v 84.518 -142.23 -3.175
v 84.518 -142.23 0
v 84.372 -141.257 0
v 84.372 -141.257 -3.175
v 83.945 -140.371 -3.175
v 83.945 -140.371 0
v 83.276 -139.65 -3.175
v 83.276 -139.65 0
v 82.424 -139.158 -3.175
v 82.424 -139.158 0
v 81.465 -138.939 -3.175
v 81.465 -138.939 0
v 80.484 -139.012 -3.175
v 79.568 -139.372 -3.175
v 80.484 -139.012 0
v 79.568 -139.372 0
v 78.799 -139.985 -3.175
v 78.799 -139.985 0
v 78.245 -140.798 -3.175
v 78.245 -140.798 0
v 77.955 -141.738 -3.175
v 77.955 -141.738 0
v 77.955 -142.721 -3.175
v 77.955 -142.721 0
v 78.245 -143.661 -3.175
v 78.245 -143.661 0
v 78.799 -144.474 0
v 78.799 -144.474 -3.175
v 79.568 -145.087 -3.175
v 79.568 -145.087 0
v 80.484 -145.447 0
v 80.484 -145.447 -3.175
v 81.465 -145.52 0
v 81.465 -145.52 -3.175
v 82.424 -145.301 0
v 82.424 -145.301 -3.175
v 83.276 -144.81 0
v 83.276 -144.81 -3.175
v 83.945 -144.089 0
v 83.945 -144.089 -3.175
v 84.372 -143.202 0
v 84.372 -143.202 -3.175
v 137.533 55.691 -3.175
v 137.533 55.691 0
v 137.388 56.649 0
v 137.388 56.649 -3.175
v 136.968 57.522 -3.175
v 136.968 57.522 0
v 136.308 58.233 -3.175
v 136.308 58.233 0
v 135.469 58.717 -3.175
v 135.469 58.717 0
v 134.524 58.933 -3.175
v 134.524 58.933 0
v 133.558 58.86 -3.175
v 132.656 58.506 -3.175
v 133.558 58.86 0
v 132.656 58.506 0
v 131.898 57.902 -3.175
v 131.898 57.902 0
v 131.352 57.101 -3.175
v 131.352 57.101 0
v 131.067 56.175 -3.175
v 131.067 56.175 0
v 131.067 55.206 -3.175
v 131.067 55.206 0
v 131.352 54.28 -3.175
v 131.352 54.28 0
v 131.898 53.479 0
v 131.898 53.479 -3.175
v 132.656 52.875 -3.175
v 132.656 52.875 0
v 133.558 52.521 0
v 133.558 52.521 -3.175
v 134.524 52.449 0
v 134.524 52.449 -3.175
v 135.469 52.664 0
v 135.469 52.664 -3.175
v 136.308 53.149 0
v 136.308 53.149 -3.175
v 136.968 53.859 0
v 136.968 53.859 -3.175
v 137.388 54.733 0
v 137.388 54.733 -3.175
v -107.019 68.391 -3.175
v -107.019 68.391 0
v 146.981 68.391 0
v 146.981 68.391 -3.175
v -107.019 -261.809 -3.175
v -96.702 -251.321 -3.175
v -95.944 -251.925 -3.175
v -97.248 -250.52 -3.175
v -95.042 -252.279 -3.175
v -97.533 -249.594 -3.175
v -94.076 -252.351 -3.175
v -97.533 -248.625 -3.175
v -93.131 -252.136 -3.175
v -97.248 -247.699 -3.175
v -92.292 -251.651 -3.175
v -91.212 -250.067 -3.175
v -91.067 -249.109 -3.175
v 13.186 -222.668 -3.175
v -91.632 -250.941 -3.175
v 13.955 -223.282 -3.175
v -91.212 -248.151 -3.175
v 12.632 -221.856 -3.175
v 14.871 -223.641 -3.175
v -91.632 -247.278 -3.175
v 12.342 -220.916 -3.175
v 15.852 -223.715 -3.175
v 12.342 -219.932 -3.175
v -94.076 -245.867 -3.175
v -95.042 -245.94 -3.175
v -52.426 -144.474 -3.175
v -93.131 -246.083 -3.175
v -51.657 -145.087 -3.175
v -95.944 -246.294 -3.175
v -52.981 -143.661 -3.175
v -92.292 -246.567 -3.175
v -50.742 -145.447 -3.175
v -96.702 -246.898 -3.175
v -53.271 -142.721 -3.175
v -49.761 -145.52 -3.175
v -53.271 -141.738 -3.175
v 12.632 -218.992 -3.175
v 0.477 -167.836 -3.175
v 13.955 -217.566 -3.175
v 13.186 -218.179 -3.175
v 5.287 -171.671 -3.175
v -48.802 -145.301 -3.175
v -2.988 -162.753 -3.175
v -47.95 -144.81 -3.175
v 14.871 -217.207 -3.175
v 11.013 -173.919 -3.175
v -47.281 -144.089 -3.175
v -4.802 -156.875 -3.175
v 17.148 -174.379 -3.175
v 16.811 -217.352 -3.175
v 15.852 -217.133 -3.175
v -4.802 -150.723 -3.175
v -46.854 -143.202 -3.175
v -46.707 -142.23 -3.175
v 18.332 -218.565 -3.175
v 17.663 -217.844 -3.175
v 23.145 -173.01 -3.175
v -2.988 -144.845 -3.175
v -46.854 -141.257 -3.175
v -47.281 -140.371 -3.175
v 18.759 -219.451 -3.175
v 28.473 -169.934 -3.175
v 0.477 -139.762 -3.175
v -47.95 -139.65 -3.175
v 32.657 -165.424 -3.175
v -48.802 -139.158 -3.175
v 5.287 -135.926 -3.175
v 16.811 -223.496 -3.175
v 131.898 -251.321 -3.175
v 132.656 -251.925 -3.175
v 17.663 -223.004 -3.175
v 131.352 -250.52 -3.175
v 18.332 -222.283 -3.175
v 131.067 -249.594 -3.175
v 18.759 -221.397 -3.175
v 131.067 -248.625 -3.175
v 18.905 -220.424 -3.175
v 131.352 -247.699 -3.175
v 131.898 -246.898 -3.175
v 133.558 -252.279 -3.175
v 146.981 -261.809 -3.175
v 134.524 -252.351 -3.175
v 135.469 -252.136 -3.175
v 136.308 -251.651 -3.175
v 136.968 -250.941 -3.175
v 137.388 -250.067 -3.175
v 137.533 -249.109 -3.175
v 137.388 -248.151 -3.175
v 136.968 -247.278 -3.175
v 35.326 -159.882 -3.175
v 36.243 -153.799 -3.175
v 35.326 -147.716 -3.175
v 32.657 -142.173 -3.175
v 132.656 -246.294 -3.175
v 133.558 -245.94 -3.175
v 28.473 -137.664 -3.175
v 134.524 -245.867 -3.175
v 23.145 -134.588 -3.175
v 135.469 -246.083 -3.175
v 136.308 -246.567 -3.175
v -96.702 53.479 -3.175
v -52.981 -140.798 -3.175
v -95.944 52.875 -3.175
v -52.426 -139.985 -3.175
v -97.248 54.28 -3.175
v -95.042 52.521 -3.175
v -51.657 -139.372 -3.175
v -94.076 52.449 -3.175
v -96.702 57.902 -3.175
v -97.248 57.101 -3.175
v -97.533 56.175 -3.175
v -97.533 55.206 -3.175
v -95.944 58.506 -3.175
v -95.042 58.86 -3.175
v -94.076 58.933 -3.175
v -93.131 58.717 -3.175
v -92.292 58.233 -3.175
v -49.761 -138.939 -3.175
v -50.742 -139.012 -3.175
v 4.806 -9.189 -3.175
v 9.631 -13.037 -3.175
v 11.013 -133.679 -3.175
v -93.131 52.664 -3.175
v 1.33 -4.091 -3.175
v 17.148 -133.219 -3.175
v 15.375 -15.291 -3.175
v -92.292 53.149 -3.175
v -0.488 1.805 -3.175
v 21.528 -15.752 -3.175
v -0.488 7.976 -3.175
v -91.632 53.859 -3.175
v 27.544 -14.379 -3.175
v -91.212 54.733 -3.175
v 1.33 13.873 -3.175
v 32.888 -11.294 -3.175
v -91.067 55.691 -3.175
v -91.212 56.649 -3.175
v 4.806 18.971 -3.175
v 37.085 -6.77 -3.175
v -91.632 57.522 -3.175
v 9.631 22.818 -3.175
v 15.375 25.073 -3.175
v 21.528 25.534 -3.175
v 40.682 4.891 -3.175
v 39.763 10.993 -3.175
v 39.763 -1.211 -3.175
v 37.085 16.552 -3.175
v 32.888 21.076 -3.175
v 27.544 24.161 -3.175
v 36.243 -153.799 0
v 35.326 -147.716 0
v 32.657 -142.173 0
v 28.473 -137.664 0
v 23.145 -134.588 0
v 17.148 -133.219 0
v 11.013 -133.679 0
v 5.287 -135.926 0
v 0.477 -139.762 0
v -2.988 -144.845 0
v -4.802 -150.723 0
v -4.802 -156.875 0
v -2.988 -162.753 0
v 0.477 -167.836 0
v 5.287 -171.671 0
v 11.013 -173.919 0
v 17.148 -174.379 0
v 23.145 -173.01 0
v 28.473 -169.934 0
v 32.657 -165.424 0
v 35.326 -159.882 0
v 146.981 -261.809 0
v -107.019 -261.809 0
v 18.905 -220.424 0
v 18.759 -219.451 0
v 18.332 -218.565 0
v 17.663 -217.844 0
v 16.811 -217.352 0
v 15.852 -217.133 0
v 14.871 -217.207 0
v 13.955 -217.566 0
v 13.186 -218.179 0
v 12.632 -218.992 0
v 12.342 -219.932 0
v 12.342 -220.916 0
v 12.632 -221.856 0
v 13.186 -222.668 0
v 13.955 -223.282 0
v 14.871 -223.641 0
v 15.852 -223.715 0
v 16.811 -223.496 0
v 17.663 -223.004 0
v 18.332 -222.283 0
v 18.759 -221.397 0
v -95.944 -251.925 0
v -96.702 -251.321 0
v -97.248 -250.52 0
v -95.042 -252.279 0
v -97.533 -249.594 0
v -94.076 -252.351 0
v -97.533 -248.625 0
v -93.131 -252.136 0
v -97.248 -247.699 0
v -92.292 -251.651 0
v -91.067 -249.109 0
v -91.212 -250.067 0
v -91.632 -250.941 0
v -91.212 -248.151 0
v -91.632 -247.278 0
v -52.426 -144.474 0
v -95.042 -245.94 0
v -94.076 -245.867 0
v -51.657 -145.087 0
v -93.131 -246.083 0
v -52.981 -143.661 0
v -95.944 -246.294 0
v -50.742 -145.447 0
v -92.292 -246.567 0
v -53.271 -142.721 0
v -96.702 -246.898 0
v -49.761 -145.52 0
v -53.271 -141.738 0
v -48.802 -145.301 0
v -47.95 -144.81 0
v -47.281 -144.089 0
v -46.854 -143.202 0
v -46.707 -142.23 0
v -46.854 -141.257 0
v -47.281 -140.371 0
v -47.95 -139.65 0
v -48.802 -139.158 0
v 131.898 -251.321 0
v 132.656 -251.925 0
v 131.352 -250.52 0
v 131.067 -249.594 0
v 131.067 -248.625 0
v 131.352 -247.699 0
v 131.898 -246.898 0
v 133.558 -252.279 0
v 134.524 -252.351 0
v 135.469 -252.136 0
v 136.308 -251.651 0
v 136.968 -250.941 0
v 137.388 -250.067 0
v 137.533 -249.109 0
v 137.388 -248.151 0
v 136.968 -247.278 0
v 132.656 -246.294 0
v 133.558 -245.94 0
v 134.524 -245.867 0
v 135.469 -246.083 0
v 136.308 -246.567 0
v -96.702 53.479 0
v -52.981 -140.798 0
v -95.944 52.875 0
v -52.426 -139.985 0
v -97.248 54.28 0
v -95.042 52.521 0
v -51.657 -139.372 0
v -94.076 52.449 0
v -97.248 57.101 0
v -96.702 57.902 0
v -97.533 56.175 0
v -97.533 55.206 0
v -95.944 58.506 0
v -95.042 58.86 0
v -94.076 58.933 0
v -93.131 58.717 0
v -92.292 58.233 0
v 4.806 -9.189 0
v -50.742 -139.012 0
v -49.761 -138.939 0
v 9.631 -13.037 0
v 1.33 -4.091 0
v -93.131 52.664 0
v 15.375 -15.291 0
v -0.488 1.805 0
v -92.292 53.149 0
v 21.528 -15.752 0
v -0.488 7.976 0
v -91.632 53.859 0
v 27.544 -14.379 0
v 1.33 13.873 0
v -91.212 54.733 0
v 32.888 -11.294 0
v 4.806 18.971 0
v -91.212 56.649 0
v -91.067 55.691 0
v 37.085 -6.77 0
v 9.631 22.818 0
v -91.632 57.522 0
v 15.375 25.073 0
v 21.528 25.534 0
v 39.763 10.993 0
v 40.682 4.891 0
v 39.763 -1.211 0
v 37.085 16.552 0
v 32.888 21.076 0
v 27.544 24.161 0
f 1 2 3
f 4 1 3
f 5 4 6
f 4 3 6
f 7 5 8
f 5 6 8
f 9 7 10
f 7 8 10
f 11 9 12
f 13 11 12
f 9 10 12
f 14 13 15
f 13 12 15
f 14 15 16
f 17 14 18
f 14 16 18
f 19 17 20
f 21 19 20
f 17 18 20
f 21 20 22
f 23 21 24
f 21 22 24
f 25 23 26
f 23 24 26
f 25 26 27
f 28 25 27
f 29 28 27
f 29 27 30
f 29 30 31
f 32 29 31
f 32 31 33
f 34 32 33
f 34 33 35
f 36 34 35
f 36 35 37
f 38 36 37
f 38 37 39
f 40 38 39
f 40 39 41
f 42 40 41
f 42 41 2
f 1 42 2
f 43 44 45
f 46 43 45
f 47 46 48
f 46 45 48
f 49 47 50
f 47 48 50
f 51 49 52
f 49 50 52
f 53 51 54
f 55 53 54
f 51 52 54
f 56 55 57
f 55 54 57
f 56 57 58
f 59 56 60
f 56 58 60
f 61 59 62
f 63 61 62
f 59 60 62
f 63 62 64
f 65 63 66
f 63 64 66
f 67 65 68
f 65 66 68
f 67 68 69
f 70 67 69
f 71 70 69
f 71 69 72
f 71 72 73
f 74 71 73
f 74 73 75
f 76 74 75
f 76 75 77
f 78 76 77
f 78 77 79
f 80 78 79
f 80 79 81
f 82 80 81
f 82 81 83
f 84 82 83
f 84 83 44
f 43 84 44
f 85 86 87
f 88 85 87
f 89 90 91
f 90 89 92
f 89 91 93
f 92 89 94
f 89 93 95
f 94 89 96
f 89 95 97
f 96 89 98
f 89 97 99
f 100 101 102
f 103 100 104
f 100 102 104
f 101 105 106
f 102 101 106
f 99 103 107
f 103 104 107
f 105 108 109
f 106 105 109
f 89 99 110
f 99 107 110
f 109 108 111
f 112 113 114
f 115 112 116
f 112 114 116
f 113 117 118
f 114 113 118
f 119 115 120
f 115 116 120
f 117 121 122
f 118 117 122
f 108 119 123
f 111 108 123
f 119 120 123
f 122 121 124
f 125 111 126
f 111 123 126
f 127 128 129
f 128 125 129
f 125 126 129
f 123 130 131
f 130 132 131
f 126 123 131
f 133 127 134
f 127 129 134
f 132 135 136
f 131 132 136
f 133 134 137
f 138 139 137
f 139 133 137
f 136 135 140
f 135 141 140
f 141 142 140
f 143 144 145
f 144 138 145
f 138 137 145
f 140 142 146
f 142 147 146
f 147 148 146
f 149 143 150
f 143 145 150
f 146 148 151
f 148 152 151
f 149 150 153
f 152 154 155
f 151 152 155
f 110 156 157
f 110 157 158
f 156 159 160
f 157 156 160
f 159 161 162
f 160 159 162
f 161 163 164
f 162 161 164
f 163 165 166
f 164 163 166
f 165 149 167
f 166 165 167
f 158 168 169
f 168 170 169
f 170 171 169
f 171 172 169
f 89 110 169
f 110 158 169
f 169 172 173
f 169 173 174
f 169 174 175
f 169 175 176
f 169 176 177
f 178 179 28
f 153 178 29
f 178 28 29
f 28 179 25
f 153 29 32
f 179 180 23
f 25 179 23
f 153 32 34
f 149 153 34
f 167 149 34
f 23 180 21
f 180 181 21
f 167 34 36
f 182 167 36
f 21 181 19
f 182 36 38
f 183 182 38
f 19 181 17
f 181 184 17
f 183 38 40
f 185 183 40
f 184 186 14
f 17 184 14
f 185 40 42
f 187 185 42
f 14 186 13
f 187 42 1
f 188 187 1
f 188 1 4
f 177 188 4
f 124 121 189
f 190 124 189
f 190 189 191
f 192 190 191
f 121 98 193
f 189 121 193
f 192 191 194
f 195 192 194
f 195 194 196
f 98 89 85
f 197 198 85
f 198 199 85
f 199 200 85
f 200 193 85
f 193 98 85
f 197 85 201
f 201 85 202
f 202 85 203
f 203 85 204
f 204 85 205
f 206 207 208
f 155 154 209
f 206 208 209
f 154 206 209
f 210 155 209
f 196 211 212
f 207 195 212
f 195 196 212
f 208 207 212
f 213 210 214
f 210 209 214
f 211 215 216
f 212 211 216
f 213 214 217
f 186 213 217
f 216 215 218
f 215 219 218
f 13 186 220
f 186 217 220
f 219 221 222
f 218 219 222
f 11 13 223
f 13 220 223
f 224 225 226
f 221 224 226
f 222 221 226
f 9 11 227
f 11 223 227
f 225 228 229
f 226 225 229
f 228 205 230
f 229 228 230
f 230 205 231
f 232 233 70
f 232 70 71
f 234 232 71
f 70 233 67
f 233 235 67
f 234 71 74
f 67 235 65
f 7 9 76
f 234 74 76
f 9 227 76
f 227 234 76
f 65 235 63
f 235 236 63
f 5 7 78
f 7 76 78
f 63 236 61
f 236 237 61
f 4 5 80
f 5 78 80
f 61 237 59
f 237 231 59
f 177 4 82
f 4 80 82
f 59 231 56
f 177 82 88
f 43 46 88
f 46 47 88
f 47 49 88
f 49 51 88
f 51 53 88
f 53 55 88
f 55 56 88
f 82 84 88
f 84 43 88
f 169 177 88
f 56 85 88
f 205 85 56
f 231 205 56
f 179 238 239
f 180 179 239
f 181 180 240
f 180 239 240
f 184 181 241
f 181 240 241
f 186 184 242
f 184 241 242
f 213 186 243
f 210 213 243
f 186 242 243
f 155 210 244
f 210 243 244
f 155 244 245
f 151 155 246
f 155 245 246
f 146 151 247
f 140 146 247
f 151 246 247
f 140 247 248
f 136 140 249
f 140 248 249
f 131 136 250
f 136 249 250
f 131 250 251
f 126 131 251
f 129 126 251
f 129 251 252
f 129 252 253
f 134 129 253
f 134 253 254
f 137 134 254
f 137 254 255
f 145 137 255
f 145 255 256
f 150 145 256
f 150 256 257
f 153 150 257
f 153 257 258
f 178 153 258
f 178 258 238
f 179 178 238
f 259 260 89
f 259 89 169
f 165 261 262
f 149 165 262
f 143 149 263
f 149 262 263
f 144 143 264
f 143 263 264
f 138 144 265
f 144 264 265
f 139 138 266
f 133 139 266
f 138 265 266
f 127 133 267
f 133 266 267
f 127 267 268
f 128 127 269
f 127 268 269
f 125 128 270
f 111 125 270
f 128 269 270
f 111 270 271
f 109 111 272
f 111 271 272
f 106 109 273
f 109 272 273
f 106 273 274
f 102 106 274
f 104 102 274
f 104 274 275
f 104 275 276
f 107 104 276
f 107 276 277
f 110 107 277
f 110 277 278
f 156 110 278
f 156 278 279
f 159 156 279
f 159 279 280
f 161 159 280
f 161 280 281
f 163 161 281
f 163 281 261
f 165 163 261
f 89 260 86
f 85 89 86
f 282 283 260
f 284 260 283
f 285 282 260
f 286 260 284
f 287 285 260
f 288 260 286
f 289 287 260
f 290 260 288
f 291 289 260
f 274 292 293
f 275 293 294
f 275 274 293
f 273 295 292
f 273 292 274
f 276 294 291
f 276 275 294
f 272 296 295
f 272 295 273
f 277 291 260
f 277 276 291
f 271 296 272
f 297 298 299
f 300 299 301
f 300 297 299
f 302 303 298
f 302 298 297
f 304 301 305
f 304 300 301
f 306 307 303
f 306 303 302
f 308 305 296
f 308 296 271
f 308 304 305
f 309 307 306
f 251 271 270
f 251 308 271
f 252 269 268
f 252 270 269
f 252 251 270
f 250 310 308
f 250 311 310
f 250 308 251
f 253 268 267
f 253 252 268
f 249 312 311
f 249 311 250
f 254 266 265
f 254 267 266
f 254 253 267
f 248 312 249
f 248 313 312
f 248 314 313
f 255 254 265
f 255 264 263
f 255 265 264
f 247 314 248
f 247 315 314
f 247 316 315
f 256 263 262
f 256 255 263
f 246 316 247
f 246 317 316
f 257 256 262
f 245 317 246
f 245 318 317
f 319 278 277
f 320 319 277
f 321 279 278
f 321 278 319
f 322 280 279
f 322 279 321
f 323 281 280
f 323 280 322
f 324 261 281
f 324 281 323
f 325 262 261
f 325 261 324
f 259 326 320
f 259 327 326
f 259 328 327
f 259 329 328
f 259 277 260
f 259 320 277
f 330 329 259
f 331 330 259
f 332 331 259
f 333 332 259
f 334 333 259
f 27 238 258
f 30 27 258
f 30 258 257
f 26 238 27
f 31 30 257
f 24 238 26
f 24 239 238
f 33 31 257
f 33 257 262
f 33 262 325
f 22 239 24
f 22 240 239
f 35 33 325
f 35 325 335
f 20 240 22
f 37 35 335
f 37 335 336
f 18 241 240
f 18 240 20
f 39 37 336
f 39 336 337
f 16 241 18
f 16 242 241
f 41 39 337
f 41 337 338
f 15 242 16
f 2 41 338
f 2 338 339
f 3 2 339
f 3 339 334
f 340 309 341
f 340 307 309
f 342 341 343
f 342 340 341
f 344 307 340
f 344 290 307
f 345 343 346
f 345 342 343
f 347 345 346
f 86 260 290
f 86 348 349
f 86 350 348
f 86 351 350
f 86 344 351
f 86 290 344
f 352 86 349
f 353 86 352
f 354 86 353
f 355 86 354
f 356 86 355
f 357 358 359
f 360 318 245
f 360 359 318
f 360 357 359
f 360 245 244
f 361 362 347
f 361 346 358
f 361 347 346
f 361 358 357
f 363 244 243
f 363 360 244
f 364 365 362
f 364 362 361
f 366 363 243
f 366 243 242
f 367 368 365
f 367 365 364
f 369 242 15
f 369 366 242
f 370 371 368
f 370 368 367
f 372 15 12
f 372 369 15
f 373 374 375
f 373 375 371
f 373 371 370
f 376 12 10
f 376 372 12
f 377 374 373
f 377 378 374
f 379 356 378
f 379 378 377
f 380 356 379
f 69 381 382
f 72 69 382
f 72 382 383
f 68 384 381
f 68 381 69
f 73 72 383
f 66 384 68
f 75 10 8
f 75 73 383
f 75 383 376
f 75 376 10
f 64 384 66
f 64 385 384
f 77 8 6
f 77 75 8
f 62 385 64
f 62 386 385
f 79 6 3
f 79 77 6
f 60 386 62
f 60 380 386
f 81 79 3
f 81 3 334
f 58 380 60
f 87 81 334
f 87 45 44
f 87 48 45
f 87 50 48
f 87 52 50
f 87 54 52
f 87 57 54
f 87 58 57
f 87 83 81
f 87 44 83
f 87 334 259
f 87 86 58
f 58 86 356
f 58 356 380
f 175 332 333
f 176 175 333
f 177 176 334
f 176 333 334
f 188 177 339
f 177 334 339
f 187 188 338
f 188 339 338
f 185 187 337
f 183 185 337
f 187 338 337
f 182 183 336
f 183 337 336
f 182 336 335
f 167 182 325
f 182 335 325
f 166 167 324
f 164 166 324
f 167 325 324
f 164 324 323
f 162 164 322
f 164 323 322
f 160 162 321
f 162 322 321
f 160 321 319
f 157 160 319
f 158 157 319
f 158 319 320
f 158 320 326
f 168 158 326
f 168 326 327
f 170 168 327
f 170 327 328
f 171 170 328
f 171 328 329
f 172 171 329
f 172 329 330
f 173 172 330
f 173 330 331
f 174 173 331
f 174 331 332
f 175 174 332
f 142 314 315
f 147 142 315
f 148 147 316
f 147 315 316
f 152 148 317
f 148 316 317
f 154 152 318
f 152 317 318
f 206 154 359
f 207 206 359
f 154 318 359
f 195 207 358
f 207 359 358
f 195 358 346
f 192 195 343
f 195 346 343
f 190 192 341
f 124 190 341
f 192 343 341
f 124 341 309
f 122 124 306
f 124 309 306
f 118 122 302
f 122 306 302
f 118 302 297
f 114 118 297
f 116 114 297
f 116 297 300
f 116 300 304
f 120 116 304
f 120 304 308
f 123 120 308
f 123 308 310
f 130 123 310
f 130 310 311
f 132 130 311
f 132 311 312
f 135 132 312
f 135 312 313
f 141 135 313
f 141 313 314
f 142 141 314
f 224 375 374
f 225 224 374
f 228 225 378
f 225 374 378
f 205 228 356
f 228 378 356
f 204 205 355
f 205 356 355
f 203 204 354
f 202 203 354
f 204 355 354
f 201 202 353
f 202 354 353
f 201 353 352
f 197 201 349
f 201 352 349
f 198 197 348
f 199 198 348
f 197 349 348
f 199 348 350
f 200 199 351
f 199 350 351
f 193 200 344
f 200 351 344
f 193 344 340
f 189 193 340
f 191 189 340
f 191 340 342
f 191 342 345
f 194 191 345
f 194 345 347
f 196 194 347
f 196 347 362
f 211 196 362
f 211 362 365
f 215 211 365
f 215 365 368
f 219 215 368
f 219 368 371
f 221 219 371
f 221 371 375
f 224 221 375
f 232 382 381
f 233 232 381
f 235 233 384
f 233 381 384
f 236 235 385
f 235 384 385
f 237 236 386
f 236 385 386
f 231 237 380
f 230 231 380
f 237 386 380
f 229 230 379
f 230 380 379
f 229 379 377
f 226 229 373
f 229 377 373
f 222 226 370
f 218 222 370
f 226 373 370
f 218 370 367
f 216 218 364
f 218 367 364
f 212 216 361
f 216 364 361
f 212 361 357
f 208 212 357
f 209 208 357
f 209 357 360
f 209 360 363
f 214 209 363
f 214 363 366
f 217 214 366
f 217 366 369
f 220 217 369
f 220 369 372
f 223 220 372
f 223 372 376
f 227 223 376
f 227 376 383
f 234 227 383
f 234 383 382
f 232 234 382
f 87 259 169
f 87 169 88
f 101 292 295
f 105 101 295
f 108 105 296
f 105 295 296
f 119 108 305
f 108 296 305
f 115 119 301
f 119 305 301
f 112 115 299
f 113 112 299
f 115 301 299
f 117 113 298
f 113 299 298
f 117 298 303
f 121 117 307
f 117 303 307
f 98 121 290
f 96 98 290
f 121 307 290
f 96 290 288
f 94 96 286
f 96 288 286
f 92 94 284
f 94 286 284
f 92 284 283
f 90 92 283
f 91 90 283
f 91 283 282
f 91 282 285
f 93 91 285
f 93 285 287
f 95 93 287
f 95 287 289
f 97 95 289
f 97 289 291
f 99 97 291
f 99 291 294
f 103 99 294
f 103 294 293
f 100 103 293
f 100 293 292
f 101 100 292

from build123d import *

# Parameters (mm, degrees)
SKETCH1_W           = 254
SKETCH1_H           = 330.2
BOSS_EXTRUDE1_DEPTH = 3.175
SKETCH2_R           = 20.701
CUT_EXTRUDE1_DEPTH  = 301.262663605
SKETCH3_R           = 3.3
SKETCH3_R_2         = 20.6375
SKETCH3_R_3         = 3.2512
CUT_EXTRUDE2_DEPTH  = 301.262663605


with BuildPart() as part:
    # Sketch1 → Boss-Extrude1 (new body)
    with BuildSketch(Plane.XY):
        with Locations((19.981406387, -96.70919141)):
            Rectangle(SKETCH1_W, SKETCH1_H)
    extrude(amount=-BOSS_EXTRUDE1_DEPTH)

    # Sketch2 → Cut-Extrude1 (cut, through all)
    with BuildSketch(Plane.XY):
        with Locations((19.981406387, 4.89080859)):
            Circle(SKETCH2_R)
    extrude(amount=-CUT_EXTRUDE1_DEPTH, mode=Mode.SUBTRACT)

    # Sketch3 → Cut-Extrude2 (cut, through all)
    with BuildSketch(Plane.XY):
        with Locations((-50.007395692, -142.229557515)):
            Circle(SKETCH3_R)
        with Locations((81.218237397, -142.229557515)):
            Circle(SKETCH3_R)
        with Locations((15.605420852, -220.423867352)):
            Circle(SKETCH3_R)
        with Locations((15.605420852, -153.798867352)):
            Circle(SKETCH3_R_2)
        with Locations((134.281406387, 55.69080859)):
            Circle(SKETCH3_R_3)
        with Locations((-94.318593613, 55.69080859)):
            Circle(SKETCH3_R_3)
        with Locations((134.281406387, -249.10919141)):
            Circle(SKETCH3_R_3)
        with Locations((-94.318593613, -249.10919141)):
            Circle(SKETCH3_R_3)
    extrude(amount=-CUT_EXTRUDE2_DEPTH, mode=Mode.SUBTRACT)


solid = part.part
